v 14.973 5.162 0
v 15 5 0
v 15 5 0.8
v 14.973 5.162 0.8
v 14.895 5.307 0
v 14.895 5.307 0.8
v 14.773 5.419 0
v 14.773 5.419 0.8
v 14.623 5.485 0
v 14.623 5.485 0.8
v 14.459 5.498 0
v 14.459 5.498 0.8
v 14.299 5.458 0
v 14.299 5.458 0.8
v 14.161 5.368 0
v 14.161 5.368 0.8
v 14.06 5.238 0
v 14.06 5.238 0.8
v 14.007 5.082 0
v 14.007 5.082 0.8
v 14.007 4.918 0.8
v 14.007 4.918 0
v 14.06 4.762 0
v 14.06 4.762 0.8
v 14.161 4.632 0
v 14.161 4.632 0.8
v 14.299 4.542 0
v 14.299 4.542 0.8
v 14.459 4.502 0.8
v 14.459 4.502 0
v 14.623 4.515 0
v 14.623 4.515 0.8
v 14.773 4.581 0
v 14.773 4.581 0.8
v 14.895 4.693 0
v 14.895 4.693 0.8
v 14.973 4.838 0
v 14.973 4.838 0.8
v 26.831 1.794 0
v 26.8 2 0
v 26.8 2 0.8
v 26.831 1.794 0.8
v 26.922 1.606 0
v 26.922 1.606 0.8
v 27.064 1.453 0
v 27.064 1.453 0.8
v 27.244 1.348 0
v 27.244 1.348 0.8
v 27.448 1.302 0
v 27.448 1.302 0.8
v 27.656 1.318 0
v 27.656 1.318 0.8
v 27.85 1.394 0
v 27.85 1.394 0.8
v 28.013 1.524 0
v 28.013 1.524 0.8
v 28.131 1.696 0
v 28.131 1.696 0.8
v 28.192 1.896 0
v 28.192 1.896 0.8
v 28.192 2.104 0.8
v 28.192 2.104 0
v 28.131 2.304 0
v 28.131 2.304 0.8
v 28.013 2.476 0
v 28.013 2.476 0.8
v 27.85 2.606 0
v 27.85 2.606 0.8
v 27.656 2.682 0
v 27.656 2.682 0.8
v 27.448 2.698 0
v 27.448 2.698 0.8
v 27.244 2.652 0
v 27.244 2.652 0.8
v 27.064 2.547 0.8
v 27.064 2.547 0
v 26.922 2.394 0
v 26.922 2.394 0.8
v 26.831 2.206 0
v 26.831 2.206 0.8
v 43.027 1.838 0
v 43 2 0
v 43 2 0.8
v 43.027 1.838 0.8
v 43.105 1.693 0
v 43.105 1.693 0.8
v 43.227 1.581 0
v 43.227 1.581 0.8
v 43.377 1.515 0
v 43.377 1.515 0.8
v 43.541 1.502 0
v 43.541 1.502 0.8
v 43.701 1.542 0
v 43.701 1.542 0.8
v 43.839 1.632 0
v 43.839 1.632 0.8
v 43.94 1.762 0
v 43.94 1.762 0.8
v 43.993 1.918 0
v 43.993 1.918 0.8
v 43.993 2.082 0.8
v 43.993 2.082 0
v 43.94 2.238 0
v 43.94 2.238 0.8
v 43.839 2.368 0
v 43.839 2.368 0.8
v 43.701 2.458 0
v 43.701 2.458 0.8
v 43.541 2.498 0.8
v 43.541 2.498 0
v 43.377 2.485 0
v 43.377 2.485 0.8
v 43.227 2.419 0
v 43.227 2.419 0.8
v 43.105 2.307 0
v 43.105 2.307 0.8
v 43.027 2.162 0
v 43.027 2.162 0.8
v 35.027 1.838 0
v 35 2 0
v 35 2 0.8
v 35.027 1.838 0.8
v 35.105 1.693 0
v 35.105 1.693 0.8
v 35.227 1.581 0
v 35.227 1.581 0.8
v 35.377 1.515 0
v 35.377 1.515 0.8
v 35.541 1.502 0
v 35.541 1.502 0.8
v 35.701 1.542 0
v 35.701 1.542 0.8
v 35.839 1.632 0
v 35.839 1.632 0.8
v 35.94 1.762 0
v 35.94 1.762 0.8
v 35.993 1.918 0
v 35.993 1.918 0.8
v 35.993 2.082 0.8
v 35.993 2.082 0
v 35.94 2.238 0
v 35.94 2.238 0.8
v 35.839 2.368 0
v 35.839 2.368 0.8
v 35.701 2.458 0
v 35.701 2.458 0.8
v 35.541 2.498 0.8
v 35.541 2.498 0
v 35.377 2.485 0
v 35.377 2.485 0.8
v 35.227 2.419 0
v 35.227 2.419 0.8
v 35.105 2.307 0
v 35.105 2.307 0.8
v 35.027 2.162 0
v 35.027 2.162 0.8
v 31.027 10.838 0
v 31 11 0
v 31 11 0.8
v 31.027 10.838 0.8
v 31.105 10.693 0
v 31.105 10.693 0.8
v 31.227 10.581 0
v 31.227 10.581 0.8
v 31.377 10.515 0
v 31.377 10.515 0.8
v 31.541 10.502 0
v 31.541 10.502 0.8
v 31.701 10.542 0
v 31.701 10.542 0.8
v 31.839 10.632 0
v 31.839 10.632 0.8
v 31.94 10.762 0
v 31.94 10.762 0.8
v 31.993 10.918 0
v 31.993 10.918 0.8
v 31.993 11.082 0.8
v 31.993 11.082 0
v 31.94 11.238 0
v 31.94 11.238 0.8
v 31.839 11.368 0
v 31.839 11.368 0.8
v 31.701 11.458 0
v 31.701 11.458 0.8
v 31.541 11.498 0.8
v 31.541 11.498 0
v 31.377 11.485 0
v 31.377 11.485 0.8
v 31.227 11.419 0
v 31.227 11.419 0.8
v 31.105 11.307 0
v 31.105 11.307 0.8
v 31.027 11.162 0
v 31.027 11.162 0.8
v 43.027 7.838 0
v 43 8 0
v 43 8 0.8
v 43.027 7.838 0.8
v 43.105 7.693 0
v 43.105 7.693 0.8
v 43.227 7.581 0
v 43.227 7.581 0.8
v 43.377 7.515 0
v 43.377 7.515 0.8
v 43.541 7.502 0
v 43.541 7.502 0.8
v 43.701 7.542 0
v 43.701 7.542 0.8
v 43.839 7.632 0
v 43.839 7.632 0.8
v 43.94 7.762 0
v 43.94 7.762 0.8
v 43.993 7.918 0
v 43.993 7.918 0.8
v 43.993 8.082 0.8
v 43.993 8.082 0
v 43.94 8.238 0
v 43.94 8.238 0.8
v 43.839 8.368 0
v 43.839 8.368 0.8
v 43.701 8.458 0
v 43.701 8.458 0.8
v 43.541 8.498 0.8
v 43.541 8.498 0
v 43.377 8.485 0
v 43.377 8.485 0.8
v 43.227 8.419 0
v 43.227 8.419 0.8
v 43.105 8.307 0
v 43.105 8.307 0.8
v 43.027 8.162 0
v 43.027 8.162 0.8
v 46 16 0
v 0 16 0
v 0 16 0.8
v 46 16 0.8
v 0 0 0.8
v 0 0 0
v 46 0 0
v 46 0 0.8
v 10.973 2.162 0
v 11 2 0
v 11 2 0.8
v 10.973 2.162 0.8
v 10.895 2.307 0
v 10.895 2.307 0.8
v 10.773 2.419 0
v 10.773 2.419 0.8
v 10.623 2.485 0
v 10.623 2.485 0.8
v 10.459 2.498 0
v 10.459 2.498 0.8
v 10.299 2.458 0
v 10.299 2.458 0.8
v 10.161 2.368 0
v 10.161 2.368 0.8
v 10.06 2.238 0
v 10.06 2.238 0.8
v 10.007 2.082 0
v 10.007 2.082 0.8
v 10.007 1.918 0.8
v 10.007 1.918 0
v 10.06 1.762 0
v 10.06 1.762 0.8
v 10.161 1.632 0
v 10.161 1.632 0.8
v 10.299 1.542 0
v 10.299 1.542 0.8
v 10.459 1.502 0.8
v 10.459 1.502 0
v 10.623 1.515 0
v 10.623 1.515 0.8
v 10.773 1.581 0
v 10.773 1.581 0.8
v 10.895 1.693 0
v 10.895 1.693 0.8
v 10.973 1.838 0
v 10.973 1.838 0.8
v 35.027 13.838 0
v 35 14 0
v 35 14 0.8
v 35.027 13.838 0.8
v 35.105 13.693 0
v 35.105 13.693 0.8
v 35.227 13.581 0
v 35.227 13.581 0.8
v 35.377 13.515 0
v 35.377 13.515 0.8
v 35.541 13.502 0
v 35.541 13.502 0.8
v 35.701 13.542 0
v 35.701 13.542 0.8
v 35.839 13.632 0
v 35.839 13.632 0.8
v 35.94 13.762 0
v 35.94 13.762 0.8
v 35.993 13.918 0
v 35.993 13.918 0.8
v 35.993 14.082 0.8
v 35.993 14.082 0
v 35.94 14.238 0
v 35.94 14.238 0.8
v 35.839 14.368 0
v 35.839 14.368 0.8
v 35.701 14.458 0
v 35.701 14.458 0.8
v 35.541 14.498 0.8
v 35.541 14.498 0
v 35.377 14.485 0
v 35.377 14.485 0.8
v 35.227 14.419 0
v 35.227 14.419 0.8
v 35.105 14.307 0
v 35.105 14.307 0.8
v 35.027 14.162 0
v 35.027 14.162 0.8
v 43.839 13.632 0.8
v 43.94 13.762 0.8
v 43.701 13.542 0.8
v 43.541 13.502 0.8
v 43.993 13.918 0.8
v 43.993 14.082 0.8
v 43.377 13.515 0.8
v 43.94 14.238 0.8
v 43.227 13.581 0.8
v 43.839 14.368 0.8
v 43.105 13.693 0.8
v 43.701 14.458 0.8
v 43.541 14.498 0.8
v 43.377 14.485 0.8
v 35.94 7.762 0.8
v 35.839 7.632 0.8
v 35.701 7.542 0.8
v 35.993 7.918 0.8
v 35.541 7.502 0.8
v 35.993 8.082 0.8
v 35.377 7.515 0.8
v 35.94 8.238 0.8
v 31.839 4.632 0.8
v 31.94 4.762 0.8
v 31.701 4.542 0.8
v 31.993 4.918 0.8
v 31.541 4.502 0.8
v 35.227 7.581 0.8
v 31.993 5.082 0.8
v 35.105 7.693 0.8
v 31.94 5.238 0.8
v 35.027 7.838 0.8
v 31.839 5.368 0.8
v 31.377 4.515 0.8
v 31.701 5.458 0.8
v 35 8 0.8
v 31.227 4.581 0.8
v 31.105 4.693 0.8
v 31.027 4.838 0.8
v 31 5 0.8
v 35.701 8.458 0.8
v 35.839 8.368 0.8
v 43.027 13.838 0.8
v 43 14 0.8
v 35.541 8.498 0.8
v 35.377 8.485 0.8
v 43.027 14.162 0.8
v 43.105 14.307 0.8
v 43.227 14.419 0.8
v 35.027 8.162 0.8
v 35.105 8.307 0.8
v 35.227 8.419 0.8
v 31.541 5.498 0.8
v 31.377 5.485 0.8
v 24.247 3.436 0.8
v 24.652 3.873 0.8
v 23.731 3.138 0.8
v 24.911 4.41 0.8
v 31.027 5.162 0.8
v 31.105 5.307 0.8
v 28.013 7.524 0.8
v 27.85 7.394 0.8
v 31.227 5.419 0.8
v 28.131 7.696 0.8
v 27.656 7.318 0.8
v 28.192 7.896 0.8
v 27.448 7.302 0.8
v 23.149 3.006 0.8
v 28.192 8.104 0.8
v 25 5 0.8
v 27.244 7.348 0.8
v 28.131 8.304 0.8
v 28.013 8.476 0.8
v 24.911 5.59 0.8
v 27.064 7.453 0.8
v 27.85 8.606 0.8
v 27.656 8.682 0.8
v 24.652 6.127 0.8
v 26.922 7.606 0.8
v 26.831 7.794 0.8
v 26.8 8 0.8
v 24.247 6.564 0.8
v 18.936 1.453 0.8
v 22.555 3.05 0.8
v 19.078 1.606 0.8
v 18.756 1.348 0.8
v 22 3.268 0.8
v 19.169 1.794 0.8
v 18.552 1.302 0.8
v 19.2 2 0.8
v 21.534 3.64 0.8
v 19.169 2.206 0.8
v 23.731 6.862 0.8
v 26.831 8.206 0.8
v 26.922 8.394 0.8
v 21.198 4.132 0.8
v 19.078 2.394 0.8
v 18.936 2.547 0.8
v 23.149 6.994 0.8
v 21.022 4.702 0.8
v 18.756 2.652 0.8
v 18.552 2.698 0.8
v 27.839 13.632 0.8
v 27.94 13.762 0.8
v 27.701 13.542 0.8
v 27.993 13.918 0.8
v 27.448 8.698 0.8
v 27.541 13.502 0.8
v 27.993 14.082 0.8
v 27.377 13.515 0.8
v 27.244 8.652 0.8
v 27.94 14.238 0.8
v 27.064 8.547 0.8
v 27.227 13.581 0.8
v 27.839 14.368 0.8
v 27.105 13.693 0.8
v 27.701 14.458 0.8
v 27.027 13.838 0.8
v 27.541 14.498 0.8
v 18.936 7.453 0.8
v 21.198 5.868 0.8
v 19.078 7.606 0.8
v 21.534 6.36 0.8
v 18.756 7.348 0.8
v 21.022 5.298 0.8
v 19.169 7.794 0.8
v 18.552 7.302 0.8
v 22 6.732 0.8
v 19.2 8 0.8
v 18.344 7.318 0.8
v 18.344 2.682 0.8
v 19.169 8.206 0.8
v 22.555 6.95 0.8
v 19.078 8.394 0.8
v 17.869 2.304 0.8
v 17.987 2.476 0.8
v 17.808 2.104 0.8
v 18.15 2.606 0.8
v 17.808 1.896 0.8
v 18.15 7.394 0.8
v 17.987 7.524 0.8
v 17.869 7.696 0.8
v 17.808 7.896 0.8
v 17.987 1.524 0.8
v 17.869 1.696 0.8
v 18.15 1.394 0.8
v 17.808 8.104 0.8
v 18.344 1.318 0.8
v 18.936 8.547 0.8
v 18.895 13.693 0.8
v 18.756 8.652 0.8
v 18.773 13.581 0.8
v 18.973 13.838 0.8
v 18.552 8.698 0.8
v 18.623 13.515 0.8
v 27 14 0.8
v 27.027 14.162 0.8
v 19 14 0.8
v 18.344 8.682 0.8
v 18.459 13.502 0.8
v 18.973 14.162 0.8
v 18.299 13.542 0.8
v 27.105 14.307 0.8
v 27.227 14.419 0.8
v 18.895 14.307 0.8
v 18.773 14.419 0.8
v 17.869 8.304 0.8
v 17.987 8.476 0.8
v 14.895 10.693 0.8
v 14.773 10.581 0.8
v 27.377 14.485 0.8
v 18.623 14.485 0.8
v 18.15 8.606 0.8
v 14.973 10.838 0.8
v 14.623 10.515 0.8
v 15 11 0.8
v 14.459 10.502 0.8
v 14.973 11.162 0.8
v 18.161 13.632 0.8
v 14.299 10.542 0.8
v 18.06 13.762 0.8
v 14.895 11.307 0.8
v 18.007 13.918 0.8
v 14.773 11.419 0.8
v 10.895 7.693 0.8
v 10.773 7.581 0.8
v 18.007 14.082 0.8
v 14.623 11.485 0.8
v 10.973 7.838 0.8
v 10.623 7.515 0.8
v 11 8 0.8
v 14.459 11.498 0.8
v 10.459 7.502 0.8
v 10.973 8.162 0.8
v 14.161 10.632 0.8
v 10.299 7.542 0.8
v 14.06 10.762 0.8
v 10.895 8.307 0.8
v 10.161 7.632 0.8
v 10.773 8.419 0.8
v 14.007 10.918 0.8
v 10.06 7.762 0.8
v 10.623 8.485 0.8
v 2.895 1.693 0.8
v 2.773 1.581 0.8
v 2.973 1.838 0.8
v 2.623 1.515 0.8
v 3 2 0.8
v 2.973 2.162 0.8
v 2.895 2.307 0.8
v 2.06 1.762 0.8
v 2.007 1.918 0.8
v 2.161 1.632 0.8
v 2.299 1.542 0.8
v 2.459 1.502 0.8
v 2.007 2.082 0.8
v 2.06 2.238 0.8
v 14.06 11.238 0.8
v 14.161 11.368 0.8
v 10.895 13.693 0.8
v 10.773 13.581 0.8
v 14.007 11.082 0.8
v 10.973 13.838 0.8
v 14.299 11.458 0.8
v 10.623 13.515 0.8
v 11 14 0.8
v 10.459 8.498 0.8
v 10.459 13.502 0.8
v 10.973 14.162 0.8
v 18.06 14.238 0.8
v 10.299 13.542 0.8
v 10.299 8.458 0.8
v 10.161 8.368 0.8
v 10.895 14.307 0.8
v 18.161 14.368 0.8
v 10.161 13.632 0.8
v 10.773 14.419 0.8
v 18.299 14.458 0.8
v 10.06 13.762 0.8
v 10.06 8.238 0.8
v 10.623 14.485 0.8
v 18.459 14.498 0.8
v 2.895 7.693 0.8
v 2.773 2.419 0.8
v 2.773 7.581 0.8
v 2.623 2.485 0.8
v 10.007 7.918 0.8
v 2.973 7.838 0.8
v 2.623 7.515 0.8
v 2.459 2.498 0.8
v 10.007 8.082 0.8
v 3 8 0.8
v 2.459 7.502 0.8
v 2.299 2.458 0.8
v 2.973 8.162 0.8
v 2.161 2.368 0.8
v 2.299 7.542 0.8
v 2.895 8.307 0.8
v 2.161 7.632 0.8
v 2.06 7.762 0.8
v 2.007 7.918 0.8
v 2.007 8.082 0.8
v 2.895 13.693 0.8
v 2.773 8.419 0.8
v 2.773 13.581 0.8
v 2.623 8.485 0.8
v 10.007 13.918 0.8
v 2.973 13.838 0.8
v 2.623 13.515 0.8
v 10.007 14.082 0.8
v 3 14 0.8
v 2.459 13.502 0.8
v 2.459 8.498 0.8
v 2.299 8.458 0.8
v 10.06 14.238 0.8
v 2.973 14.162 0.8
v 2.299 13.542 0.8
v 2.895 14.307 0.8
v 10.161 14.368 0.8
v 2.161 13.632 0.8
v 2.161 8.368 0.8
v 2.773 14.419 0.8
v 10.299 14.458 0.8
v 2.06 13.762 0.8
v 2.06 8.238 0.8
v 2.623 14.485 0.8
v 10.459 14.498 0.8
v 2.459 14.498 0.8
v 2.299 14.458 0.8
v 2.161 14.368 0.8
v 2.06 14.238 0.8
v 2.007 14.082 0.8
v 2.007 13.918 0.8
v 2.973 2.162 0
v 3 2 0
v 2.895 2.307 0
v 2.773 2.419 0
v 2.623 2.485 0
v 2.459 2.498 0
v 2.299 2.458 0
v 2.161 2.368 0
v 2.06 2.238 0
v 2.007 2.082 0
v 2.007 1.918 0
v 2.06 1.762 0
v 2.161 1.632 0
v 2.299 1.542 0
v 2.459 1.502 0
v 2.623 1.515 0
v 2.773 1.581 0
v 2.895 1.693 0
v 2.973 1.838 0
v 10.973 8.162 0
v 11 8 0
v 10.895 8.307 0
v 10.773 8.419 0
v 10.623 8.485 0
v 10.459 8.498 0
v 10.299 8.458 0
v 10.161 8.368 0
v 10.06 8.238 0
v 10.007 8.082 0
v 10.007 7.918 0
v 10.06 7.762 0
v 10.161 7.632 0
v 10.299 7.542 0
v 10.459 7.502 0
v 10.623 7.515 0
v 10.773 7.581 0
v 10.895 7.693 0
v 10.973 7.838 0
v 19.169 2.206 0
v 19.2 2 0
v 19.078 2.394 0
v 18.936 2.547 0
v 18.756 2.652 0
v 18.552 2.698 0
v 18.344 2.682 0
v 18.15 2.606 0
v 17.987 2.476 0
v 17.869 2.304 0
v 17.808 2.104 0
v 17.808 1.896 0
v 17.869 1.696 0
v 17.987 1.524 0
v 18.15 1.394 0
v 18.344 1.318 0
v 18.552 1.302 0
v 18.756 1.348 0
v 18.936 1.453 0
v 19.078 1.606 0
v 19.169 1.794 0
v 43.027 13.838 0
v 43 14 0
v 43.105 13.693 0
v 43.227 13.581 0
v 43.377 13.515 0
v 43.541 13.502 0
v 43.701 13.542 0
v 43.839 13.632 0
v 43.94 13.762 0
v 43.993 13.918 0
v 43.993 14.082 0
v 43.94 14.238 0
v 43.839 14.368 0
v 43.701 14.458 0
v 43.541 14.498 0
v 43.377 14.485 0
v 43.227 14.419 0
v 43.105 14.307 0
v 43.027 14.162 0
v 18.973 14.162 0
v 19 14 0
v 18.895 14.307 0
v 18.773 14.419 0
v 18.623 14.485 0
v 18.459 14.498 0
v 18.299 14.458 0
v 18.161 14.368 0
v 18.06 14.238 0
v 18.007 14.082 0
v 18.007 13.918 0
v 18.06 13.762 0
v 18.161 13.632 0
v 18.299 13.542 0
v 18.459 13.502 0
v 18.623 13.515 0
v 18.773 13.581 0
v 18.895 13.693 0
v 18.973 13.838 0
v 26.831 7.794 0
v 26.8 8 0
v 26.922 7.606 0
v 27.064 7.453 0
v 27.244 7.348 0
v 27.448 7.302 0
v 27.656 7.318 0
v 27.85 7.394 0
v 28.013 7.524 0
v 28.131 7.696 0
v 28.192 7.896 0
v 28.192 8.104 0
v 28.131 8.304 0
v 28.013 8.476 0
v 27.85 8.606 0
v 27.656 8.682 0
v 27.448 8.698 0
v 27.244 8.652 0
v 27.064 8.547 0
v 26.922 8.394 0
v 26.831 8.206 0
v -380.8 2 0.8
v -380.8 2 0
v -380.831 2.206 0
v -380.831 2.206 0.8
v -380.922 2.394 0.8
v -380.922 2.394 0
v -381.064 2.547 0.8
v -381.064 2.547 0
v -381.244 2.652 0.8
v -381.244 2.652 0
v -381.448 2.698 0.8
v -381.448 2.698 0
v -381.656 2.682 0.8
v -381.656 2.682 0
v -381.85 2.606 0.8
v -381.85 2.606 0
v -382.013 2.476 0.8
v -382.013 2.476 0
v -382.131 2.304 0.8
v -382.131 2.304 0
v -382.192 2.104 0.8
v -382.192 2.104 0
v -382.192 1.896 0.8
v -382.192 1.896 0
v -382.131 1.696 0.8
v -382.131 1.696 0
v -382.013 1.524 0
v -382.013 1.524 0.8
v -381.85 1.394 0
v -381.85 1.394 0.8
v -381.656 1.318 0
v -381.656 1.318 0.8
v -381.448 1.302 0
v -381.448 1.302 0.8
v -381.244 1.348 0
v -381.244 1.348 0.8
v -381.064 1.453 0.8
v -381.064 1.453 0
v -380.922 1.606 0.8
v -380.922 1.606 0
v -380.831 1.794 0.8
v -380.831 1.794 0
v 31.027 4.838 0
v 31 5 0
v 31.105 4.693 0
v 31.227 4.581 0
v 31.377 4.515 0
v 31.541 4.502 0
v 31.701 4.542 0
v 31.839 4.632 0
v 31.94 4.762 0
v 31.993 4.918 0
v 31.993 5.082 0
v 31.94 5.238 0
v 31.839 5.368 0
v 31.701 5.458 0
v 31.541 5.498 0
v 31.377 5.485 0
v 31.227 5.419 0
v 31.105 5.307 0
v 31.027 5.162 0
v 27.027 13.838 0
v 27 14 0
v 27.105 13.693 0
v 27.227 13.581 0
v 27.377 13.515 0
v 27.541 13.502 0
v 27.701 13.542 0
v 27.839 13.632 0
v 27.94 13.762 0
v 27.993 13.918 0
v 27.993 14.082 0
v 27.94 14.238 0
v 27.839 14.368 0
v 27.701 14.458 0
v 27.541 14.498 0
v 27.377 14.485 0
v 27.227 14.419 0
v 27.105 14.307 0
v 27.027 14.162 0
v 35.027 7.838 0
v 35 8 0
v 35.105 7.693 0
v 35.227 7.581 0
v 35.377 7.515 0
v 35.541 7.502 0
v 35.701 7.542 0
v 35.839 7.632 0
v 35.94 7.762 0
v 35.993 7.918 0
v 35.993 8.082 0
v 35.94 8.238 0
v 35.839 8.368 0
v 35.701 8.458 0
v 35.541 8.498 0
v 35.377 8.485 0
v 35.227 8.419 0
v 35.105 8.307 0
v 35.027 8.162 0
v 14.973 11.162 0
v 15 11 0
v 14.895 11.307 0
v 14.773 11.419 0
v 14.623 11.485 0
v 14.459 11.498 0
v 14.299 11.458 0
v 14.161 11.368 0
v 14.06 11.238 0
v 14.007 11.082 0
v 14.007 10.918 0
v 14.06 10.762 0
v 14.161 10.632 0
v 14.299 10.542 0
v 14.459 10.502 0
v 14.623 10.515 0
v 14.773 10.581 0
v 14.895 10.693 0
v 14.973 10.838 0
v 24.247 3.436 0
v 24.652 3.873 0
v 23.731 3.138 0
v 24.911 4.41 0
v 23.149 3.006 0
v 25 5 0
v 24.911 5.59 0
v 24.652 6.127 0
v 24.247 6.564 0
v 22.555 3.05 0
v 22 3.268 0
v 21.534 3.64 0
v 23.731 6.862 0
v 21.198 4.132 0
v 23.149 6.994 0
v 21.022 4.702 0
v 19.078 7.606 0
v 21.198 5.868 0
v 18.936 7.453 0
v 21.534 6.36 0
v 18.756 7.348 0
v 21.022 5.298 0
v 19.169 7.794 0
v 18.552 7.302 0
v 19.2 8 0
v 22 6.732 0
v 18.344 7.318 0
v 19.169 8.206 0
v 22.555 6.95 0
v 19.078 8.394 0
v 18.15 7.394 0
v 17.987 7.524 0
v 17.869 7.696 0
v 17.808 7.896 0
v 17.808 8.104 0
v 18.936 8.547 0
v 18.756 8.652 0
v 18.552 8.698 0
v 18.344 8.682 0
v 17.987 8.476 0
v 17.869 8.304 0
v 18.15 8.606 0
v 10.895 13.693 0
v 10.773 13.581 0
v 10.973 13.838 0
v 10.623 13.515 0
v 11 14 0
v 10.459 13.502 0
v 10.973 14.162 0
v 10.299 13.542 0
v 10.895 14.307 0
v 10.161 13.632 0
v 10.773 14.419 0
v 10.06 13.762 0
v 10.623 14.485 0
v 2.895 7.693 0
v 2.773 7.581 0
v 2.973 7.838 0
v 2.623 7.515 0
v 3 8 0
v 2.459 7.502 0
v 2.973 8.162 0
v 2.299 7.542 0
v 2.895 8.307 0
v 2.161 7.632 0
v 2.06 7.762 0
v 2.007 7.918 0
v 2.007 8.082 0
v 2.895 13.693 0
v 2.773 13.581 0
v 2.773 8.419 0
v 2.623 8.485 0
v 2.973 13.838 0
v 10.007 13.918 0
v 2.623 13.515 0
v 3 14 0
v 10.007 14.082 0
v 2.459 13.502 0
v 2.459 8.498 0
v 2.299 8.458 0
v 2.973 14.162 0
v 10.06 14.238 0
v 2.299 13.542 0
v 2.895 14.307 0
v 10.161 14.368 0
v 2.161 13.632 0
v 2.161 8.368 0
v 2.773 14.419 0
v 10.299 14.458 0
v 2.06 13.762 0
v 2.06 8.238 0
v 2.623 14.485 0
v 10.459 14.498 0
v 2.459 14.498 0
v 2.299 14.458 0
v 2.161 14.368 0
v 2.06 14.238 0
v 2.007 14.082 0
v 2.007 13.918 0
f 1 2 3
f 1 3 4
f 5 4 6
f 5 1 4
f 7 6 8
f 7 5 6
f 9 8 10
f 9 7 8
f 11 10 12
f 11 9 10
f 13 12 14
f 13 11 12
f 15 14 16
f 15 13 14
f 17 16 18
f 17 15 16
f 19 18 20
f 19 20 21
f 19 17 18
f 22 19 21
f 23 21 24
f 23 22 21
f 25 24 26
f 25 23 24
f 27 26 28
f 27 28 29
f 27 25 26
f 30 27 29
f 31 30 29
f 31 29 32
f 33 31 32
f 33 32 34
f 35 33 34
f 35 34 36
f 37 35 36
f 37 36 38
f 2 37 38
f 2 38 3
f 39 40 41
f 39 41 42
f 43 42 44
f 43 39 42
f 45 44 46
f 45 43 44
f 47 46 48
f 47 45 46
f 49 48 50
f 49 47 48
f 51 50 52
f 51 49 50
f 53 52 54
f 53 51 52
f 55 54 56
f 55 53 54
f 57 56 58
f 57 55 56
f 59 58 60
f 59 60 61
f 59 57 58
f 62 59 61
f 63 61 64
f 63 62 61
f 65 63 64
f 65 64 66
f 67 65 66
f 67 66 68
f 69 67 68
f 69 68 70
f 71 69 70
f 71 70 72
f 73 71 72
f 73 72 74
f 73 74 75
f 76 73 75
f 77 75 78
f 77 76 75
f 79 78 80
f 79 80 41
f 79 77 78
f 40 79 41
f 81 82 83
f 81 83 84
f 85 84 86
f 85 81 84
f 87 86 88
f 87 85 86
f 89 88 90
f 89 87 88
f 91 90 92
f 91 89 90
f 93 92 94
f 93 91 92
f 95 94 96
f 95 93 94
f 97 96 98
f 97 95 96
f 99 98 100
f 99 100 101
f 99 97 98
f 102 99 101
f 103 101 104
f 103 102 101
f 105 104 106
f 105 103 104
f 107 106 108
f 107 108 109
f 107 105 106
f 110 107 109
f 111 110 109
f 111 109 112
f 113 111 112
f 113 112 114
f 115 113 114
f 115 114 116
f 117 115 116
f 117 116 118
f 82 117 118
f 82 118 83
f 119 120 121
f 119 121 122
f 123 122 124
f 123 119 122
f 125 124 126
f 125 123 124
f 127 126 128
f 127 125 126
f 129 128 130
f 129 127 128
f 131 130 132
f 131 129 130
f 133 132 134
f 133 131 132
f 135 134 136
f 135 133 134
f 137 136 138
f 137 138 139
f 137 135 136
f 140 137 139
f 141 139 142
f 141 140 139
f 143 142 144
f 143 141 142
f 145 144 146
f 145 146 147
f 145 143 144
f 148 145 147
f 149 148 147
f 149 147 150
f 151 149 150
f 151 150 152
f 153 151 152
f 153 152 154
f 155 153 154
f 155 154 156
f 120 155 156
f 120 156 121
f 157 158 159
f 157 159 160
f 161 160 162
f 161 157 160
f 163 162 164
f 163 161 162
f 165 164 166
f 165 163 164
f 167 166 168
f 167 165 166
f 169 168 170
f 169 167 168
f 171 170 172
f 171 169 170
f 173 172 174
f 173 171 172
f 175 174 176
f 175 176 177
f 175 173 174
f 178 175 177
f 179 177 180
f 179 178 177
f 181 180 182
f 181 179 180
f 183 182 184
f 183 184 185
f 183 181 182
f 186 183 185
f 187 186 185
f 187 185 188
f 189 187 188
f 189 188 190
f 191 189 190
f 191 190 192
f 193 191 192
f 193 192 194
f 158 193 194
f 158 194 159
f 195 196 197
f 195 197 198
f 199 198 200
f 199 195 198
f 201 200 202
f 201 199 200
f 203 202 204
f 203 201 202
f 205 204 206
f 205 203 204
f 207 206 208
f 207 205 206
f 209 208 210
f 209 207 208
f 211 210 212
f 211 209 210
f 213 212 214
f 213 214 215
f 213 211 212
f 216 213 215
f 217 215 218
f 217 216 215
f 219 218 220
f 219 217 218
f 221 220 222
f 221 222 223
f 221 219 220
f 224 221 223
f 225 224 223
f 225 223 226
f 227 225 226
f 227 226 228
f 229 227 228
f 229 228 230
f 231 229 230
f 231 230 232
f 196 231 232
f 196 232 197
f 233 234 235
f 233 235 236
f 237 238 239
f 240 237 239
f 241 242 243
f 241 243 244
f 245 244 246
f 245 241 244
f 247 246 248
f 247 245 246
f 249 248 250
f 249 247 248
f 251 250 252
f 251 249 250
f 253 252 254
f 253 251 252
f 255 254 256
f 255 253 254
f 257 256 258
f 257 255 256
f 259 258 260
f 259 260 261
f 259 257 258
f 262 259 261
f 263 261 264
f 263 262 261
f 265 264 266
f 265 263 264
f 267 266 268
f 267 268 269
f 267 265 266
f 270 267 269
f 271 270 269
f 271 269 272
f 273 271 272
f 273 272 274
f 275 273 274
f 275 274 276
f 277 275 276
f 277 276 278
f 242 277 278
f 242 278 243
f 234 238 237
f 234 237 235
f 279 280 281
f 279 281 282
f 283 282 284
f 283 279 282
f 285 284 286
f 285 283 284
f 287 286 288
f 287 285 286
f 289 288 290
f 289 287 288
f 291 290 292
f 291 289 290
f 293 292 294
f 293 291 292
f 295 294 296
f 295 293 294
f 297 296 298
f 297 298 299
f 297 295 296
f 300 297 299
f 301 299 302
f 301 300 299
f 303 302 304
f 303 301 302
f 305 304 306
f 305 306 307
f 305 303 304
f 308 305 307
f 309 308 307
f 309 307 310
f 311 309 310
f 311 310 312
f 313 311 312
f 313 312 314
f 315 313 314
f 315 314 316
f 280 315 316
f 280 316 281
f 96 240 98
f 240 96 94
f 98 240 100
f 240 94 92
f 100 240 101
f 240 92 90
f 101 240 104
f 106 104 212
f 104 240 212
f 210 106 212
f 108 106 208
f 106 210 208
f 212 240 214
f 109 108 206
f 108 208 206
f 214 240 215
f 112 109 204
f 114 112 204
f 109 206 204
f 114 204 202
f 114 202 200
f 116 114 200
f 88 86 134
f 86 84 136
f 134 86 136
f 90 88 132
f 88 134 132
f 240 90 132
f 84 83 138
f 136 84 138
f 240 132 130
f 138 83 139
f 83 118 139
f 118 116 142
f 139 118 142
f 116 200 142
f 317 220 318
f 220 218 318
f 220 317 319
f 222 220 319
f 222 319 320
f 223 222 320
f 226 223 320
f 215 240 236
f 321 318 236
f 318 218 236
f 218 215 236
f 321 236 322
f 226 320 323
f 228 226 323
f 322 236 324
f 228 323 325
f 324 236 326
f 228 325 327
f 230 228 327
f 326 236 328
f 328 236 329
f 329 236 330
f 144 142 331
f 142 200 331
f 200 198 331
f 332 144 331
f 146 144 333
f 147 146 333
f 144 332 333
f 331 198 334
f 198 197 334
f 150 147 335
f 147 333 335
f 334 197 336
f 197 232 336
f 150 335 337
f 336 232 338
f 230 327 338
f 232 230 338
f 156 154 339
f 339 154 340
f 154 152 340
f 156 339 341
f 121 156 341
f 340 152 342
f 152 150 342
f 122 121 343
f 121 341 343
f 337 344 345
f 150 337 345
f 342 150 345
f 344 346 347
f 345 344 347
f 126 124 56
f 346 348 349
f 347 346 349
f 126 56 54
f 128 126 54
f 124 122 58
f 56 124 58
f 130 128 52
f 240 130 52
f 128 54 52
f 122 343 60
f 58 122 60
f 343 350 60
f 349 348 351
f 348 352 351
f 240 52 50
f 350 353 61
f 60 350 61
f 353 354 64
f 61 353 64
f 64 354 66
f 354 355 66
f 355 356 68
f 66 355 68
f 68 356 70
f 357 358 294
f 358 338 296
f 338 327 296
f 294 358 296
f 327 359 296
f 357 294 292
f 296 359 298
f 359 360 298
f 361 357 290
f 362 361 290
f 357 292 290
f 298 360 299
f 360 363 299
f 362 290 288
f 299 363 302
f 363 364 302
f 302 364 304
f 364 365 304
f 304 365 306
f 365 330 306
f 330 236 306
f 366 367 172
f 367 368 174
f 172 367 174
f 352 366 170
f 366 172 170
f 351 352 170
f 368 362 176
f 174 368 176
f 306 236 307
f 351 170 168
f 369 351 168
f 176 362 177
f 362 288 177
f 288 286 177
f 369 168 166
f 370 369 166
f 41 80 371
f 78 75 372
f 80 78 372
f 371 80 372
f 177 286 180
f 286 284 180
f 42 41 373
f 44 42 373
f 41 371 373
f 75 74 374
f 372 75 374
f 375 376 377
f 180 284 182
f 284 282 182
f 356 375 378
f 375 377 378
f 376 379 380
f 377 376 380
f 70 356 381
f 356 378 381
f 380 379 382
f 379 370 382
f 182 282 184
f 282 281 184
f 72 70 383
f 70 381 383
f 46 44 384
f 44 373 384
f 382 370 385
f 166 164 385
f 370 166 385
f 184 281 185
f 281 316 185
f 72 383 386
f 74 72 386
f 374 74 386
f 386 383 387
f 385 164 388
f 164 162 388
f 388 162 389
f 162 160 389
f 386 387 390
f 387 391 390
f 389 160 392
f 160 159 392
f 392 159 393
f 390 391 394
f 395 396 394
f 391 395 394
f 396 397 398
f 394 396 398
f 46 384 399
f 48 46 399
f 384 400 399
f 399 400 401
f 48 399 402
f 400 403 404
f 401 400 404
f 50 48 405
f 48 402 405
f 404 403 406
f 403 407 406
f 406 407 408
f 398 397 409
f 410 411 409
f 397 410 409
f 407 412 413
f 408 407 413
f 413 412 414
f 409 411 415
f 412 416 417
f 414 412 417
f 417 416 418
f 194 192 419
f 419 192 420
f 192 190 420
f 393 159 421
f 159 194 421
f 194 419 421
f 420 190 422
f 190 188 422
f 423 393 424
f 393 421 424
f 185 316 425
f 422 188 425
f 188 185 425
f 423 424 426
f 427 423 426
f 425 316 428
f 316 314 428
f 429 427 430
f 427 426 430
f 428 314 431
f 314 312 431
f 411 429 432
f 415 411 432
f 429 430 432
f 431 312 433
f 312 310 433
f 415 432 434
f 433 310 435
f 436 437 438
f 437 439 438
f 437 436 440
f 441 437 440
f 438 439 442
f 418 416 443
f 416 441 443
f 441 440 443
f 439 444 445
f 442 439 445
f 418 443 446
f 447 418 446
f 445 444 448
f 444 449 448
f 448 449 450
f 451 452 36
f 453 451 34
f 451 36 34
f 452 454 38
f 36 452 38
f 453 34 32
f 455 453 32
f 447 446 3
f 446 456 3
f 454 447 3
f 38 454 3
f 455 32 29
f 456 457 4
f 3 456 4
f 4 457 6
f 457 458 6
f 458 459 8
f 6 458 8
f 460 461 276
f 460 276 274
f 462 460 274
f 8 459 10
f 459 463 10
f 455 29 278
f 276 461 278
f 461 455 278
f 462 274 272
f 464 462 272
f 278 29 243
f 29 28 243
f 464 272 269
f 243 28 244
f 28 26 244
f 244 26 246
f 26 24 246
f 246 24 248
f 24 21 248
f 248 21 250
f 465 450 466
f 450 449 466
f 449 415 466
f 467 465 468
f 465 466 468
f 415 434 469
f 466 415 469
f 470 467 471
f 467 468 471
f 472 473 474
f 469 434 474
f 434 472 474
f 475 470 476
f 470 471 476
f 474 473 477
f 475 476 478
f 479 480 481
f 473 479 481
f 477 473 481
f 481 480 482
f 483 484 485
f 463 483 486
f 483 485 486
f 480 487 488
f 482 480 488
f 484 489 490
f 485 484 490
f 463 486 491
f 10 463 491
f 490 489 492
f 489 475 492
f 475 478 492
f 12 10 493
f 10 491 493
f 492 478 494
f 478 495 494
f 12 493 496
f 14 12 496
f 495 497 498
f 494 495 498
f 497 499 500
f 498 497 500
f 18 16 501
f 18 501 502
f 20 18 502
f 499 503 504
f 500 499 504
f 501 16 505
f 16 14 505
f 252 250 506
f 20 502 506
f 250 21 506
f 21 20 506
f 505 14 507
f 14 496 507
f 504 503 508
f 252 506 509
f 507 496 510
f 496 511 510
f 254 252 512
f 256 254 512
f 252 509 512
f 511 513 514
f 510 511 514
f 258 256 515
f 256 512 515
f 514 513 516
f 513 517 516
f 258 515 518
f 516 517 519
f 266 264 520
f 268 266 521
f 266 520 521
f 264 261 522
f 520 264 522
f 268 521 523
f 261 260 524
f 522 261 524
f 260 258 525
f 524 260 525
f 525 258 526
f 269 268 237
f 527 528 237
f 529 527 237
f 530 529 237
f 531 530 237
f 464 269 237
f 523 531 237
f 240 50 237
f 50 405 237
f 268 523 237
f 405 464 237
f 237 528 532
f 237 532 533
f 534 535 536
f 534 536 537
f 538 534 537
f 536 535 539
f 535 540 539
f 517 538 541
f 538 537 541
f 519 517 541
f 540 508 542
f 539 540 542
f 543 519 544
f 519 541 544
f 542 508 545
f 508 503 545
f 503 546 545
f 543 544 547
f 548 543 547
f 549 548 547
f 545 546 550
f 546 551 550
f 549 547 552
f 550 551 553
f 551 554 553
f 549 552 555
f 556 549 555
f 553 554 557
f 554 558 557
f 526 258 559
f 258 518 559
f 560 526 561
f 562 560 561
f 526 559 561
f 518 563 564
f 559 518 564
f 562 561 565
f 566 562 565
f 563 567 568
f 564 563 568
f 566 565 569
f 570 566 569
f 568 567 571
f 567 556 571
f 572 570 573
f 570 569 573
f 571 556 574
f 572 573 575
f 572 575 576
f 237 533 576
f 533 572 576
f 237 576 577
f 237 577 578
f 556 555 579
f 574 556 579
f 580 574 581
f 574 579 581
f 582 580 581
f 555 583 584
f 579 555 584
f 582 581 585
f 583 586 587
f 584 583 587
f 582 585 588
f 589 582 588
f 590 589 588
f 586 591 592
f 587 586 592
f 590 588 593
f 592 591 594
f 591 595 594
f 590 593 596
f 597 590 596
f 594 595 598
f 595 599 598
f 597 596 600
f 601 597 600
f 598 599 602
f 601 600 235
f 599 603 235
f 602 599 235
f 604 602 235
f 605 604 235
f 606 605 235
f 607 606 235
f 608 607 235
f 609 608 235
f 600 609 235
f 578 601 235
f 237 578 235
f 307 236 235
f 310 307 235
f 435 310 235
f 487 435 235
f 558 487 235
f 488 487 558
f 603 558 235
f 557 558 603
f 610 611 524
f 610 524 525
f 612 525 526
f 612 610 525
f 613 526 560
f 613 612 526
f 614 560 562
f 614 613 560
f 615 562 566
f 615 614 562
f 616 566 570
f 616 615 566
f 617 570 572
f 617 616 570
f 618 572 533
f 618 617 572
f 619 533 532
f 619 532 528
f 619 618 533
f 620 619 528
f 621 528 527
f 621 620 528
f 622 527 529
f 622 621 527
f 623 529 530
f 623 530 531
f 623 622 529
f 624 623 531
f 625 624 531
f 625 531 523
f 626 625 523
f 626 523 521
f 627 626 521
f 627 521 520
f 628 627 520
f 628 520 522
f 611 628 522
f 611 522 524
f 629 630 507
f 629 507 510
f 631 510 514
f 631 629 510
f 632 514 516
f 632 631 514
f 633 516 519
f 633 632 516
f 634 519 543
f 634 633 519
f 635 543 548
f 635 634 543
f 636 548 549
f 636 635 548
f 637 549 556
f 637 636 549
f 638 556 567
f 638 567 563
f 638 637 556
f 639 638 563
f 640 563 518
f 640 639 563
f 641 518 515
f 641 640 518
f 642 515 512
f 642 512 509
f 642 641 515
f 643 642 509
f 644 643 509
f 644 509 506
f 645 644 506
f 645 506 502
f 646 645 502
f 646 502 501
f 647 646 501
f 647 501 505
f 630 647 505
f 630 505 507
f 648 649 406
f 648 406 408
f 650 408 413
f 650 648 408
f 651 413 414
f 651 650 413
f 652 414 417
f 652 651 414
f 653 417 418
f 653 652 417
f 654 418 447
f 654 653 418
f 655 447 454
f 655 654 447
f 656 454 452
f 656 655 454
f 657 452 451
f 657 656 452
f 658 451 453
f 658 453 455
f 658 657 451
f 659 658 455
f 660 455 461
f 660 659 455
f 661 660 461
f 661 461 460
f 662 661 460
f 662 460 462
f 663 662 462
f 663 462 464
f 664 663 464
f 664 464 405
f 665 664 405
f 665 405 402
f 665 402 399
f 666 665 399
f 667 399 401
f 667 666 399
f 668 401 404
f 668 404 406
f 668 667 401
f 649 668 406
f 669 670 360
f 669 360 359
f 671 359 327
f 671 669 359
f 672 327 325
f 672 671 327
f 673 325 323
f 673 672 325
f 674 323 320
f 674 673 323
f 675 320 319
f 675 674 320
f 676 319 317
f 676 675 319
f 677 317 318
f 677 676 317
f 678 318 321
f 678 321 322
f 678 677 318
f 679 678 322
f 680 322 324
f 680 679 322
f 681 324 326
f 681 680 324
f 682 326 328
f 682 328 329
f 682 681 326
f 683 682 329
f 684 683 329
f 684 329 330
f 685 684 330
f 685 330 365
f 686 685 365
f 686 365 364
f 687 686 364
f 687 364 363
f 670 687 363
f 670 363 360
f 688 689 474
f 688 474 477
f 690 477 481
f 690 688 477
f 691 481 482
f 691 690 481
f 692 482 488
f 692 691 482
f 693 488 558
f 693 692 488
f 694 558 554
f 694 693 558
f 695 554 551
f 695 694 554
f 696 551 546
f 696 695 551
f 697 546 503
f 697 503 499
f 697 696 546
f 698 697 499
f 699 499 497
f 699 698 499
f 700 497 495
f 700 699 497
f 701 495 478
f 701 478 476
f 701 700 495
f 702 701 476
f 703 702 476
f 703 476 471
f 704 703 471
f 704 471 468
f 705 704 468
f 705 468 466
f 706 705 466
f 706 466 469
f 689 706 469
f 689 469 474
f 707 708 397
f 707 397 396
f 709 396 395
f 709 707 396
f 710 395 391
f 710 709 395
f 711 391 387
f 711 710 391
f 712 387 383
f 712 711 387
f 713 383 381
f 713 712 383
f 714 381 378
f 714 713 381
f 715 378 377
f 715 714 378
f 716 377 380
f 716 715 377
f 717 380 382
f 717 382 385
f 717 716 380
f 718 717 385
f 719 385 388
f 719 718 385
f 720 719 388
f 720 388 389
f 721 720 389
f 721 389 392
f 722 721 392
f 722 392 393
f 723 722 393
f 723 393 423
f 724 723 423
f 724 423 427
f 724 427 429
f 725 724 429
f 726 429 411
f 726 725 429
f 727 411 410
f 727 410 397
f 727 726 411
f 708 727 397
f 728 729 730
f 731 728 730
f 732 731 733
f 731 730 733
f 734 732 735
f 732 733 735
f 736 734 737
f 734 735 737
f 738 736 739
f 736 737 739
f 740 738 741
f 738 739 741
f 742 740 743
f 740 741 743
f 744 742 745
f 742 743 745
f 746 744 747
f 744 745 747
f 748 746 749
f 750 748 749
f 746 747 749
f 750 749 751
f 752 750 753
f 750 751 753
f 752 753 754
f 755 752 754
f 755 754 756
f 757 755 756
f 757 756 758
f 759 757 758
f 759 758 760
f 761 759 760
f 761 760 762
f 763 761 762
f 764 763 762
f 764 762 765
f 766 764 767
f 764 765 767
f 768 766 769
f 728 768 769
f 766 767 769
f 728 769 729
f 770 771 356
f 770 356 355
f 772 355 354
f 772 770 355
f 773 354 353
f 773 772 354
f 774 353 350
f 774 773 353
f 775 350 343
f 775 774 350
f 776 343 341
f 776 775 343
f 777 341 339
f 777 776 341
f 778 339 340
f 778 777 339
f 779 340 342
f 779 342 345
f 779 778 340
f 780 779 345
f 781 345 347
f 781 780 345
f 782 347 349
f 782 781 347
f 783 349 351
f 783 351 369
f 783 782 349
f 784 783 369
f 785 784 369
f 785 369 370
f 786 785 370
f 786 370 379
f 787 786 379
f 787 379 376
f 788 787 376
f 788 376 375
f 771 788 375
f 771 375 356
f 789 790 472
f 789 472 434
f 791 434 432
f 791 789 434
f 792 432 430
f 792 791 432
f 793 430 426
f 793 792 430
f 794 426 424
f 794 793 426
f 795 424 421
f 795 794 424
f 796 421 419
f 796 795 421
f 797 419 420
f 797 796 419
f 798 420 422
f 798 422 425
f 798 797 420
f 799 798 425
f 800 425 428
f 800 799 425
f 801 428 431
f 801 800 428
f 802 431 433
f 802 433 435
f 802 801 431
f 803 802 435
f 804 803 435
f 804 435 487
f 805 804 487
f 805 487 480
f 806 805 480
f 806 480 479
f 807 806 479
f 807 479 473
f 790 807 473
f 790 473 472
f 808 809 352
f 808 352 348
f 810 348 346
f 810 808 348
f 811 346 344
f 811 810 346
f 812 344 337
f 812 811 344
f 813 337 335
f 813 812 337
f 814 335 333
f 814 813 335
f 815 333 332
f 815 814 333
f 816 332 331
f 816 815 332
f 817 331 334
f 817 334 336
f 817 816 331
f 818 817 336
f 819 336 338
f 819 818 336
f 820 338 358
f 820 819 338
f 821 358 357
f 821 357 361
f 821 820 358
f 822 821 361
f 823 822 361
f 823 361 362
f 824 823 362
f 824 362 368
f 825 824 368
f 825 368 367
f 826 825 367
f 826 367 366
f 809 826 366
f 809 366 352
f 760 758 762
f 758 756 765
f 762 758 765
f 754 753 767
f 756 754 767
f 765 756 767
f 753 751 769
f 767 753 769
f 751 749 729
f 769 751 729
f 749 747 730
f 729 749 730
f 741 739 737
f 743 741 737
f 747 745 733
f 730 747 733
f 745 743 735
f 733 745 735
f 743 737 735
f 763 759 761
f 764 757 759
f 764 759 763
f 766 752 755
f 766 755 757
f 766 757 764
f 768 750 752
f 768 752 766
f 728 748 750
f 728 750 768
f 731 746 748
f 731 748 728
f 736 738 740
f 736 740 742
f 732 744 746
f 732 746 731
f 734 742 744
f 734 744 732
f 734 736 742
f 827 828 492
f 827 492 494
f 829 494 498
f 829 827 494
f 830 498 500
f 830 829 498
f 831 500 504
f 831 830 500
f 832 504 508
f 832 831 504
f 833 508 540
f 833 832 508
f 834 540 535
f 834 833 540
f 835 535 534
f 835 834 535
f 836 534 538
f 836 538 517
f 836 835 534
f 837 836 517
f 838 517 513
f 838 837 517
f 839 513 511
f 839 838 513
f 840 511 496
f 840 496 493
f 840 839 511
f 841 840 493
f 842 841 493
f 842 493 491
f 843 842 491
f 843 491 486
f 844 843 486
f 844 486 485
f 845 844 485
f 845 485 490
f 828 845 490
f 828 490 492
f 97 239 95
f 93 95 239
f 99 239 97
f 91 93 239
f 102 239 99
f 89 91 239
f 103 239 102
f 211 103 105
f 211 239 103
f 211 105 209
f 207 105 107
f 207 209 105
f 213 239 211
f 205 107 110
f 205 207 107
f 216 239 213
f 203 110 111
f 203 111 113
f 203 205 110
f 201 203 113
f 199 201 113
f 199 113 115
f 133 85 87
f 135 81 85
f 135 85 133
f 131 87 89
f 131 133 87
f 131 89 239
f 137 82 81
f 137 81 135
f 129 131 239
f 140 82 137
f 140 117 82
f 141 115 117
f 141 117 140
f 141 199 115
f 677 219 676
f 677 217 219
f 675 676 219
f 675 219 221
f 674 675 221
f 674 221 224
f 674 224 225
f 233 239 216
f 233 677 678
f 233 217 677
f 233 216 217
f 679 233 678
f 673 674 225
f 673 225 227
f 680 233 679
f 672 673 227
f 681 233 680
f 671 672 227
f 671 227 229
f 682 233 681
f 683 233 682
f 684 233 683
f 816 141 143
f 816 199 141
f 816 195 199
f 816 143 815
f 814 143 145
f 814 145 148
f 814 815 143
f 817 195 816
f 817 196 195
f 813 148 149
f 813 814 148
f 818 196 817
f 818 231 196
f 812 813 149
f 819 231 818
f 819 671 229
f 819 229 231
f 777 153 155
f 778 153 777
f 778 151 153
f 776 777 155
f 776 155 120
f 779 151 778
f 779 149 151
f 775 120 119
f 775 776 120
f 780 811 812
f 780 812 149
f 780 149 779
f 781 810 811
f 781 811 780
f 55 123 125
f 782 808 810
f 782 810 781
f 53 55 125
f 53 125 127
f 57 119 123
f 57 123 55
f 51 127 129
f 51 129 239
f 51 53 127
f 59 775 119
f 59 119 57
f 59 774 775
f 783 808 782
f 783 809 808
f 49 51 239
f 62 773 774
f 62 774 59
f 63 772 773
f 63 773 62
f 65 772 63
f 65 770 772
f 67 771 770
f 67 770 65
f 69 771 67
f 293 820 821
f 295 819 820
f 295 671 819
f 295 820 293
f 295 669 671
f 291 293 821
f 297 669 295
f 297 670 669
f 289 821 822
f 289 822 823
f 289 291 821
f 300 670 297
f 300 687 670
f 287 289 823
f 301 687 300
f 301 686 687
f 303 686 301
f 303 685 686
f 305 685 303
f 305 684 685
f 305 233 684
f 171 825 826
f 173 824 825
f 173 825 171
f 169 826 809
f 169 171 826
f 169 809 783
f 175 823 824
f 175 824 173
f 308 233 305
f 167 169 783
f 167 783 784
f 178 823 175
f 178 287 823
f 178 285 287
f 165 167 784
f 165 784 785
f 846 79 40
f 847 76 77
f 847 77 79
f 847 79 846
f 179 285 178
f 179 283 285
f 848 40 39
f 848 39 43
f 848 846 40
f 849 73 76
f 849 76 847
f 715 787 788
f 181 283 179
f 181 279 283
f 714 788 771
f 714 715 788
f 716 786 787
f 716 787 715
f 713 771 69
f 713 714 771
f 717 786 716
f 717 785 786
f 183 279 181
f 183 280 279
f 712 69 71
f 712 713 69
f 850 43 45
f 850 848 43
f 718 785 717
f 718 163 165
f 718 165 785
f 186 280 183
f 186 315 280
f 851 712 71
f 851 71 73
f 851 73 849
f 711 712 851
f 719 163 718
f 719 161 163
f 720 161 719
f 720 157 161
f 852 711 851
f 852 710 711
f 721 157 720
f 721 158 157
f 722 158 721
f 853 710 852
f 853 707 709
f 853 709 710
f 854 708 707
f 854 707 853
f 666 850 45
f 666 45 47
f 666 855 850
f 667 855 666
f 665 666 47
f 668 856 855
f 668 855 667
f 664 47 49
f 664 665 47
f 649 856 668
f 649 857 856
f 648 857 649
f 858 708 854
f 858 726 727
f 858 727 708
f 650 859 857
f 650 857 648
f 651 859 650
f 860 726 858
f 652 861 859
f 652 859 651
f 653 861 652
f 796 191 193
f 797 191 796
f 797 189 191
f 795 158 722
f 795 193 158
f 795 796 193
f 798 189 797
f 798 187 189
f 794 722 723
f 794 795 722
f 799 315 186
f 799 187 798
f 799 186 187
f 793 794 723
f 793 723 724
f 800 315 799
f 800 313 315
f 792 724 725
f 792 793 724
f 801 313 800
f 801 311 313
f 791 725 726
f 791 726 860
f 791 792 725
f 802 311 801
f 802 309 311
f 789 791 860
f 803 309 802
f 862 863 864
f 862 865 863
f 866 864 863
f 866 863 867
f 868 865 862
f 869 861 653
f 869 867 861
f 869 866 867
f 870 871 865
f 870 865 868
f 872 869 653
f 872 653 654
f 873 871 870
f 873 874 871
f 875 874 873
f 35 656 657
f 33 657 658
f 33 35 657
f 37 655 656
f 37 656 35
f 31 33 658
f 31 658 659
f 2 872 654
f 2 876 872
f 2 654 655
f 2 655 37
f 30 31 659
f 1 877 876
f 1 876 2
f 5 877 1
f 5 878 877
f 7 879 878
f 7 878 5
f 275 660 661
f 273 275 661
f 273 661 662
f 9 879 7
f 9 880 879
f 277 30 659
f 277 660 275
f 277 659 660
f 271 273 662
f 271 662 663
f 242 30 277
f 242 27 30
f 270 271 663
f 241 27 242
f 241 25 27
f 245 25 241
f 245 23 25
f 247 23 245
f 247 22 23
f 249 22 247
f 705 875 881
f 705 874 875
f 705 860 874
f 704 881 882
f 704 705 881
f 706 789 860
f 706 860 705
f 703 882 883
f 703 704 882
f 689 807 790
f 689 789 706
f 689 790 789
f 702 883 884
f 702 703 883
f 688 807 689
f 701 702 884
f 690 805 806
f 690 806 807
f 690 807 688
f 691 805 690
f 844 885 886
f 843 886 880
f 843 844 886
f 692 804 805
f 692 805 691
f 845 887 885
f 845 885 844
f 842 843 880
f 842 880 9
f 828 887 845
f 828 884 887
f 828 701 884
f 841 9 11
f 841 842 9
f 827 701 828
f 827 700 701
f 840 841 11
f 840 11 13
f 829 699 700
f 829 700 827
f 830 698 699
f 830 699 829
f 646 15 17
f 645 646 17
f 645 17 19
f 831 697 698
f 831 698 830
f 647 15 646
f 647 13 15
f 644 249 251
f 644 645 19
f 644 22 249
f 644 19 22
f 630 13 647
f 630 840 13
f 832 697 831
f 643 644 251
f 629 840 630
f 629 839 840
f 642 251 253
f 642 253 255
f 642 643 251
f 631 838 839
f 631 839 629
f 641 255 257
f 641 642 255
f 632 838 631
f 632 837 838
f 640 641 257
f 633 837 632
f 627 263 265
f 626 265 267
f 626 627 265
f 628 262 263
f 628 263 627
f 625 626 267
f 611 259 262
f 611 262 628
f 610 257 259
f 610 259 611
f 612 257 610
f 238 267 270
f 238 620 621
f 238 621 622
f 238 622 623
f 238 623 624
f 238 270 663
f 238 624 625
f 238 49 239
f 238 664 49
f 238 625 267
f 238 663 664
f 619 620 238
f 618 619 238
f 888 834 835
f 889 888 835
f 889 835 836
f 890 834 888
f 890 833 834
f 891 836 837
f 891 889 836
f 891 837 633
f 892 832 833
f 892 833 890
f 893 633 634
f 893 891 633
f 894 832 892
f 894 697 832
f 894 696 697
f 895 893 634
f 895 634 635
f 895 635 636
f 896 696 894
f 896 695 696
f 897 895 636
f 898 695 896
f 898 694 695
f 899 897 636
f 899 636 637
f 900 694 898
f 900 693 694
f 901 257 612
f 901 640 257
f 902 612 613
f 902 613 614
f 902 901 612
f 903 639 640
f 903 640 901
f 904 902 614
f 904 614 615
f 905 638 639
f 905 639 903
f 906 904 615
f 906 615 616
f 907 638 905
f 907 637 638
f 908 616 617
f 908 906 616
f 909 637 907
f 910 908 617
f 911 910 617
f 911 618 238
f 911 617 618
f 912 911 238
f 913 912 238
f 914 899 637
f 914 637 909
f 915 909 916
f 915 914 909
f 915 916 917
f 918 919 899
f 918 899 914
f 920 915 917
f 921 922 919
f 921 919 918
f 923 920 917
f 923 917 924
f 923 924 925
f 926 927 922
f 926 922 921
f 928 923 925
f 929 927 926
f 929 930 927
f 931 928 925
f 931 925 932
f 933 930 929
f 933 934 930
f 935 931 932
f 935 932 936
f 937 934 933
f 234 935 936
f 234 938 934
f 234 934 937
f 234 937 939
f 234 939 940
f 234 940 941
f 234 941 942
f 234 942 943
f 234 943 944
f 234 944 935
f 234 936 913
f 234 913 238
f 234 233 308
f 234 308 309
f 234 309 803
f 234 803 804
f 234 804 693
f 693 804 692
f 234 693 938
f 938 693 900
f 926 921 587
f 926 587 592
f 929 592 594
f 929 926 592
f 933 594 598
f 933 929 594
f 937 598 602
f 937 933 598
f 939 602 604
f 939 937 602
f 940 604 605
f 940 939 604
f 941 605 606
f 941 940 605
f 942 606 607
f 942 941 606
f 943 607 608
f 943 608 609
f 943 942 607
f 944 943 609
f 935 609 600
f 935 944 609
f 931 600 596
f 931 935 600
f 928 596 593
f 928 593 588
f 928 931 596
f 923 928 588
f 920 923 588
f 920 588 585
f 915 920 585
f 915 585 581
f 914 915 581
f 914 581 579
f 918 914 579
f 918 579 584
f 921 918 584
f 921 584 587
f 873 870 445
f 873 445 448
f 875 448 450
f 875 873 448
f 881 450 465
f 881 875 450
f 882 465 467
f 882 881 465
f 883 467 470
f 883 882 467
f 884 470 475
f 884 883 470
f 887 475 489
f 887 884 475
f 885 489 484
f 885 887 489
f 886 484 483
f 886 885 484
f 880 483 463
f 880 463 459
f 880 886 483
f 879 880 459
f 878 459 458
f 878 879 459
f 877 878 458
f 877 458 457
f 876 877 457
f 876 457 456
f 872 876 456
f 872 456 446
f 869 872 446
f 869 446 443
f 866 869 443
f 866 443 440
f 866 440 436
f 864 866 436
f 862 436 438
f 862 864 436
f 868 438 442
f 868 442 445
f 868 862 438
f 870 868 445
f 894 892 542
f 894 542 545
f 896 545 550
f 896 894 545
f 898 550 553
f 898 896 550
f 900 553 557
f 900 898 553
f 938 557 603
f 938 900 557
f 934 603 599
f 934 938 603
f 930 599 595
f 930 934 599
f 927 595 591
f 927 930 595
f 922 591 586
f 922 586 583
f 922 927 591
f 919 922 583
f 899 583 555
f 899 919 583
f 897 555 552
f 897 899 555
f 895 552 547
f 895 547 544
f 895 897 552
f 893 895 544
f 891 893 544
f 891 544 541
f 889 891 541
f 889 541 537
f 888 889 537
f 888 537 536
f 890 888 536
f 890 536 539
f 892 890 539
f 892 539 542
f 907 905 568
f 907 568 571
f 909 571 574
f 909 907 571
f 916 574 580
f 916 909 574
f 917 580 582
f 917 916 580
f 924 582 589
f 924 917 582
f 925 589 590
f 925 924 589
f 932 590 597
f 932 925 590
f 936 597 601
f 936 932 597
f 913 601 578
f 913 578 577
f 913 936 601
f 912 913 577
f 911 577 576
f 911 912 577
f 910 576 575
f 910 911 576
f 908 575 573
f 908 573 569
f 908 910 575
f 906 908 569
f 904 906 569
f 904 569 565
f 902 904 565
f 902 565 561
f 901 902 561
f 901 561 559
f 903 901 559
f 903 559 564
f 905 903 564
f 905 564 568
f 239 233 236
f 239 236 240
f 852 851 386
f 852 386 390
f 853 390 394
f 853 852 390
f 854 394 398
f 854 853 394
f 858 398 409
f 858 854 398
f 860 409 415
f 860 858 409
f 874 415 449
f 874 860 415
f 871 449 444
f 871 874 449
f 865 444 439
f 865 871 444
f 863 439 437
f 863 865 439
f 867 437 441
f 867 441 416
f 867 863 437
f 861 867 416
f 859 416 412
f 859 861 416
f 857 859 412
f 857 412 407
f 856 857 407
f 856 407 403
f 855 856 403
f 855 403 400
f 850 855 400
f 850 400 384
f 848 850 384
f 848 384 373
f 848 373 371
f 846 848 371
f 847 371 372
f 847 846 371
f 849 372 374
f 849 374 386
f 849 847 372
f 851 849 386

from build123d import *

# Parameters (mm, degrees)
ESQUISSE1_R          = 0.7
BOSS_EXTRU_1_DEPTH   = 0.8
ESQUISSE1_R_2        = 0.5
ESQUISSE1_R_3        = 2
BOSS_EXTRU_1_2_DEPTH = 0.8


with BuildPart() as part:
    # Esquisse1 → Boss.-Extru.1 (new body)
    with BuildSketch(Plane.XY):
        with Locations((-381.5, 2)):
            Circle(ESQUISSE1_R)
    extrude(amount=BOSS_EXTRU_1_DEPTH)


with BuildPart() as body_2:
    # Esquisse1 → Boss.-Extru.1 2 (new body)
    with BuildSketch(Plane.XY):
        Polygon((23, 0), (0, 0), (0, 16), (46, 16), (46, 0), align=None)
        with Locations((2.5, 8)):
            Circle(ESQUISSE1_R_2, mode=Mode.SUBTRACT)
        with Locations((2.5, 14)):
            Circle(ESQUISSE1_R_2, mode=Mode.SUBTRACT)
        with Locations((2.5, 2)):
            Circle(ESQUISSE1_R_2, mode=Mode.SUBTRACT)
        with Locations((10.5, 8)):
            Circle(ESQUISSE1_R_2, mode=Mode.SUBTRACT)
        with Locations((10.5, 2)):
            Circle(ESQUISSE1_R_2, mode=Mode.SUBTRACT)
        with Locations((10.5, 14)):
            Circle(ESQUISSE1_R_2, mode=Mode.SUBTRACT)
        with Locations((23, 5)):
            Circle(ESQUISSE1_R_3, mode=Mode.SUBTRACT)
        with Locations((18.5, 14)):
            Circle(ESQUISSE1_R_2, mode=Mode.SUBTRACT)
        with Locations((14.5, 5)):
            Circle(ESQUISSE1_R_2, mode=Mode.SUBTRACT)
        with Locations((14.5, 11)):
            Circle(ESQUISSE1_R_2, mode=Mode.SUBTRACT)
        with Locations((18.5, 2)):
            Circle(ESQUISSE1_R, mode=Mode.SUBTRACT)
        with Locations((18.5, 8)):
            Circle(ESQUISSE1_R, mode=Mode.SUBTRACT)
        with Locations(Location((27.5, 2, 0), (0, 0, 180))):
            Circle(ESQUISSE1_R, mode=Mode.SUBTRACT)
        with Locations(Location((31.5, 11, 0), (0, 0, 180))):
            Circle(ESQUISSE1_R_2, mode=Mode.SUBTRACT)
        with Locations(Location((31.5, 5, 0), (0, 0, 180))):
            Circle(ESQUISSE1_R_2, mode=Mode.SUBTRACT)
        with Locations(Location((27.5, 14, 0), (0, 0, 180))):
            Circle(ESQUISSE1_R_2, mode=Mode.SUBTRACT)
        with Locations(Location((35.5, 14, 0), (0, 0, 180))):
            Circle(ESQUISSE1_R_2, mode=Mode.SUBTRACT)
        with Locations(Location((35.5, 2, 0), (0, 0, 180))):
            Circle(ESQUISSE1_R_2, mode=Mode.SUBTRACT)
        with Locations(Location((35.5, 8, 0), (0, 0, 180))):
            Circle(ESQUISSE1_R_2, mode=Mode.SUBTRACT)
        with Locations(Location((43.5, 2, 0), (0, 0, 180))):
            Circle(ESQUISSE1_R_2, mode=Mode.SUBTRACT)
        with Locations(Location((43.5, 14, 0), (0, 0, 180))):
            Circle(ESQUISSE1_R_2, mode=Mode.SUBTRACT)
        with Locations(Location((43.5, 8, 0), (0, 0, 180))):
            Circle(ESQUISSE1_R_2, mode=Mode.SUBTRACT)
        with Locations(Location((27.5, 8, 0), (0, 0, 180))):
            Circle(ESQUISSE1_R, mode=Mode.SUBTRACT)
    extrude(amount=BOSS_EXTRU_1_2_DEPTH)


solid = Compound([part.part, body_2.part])
